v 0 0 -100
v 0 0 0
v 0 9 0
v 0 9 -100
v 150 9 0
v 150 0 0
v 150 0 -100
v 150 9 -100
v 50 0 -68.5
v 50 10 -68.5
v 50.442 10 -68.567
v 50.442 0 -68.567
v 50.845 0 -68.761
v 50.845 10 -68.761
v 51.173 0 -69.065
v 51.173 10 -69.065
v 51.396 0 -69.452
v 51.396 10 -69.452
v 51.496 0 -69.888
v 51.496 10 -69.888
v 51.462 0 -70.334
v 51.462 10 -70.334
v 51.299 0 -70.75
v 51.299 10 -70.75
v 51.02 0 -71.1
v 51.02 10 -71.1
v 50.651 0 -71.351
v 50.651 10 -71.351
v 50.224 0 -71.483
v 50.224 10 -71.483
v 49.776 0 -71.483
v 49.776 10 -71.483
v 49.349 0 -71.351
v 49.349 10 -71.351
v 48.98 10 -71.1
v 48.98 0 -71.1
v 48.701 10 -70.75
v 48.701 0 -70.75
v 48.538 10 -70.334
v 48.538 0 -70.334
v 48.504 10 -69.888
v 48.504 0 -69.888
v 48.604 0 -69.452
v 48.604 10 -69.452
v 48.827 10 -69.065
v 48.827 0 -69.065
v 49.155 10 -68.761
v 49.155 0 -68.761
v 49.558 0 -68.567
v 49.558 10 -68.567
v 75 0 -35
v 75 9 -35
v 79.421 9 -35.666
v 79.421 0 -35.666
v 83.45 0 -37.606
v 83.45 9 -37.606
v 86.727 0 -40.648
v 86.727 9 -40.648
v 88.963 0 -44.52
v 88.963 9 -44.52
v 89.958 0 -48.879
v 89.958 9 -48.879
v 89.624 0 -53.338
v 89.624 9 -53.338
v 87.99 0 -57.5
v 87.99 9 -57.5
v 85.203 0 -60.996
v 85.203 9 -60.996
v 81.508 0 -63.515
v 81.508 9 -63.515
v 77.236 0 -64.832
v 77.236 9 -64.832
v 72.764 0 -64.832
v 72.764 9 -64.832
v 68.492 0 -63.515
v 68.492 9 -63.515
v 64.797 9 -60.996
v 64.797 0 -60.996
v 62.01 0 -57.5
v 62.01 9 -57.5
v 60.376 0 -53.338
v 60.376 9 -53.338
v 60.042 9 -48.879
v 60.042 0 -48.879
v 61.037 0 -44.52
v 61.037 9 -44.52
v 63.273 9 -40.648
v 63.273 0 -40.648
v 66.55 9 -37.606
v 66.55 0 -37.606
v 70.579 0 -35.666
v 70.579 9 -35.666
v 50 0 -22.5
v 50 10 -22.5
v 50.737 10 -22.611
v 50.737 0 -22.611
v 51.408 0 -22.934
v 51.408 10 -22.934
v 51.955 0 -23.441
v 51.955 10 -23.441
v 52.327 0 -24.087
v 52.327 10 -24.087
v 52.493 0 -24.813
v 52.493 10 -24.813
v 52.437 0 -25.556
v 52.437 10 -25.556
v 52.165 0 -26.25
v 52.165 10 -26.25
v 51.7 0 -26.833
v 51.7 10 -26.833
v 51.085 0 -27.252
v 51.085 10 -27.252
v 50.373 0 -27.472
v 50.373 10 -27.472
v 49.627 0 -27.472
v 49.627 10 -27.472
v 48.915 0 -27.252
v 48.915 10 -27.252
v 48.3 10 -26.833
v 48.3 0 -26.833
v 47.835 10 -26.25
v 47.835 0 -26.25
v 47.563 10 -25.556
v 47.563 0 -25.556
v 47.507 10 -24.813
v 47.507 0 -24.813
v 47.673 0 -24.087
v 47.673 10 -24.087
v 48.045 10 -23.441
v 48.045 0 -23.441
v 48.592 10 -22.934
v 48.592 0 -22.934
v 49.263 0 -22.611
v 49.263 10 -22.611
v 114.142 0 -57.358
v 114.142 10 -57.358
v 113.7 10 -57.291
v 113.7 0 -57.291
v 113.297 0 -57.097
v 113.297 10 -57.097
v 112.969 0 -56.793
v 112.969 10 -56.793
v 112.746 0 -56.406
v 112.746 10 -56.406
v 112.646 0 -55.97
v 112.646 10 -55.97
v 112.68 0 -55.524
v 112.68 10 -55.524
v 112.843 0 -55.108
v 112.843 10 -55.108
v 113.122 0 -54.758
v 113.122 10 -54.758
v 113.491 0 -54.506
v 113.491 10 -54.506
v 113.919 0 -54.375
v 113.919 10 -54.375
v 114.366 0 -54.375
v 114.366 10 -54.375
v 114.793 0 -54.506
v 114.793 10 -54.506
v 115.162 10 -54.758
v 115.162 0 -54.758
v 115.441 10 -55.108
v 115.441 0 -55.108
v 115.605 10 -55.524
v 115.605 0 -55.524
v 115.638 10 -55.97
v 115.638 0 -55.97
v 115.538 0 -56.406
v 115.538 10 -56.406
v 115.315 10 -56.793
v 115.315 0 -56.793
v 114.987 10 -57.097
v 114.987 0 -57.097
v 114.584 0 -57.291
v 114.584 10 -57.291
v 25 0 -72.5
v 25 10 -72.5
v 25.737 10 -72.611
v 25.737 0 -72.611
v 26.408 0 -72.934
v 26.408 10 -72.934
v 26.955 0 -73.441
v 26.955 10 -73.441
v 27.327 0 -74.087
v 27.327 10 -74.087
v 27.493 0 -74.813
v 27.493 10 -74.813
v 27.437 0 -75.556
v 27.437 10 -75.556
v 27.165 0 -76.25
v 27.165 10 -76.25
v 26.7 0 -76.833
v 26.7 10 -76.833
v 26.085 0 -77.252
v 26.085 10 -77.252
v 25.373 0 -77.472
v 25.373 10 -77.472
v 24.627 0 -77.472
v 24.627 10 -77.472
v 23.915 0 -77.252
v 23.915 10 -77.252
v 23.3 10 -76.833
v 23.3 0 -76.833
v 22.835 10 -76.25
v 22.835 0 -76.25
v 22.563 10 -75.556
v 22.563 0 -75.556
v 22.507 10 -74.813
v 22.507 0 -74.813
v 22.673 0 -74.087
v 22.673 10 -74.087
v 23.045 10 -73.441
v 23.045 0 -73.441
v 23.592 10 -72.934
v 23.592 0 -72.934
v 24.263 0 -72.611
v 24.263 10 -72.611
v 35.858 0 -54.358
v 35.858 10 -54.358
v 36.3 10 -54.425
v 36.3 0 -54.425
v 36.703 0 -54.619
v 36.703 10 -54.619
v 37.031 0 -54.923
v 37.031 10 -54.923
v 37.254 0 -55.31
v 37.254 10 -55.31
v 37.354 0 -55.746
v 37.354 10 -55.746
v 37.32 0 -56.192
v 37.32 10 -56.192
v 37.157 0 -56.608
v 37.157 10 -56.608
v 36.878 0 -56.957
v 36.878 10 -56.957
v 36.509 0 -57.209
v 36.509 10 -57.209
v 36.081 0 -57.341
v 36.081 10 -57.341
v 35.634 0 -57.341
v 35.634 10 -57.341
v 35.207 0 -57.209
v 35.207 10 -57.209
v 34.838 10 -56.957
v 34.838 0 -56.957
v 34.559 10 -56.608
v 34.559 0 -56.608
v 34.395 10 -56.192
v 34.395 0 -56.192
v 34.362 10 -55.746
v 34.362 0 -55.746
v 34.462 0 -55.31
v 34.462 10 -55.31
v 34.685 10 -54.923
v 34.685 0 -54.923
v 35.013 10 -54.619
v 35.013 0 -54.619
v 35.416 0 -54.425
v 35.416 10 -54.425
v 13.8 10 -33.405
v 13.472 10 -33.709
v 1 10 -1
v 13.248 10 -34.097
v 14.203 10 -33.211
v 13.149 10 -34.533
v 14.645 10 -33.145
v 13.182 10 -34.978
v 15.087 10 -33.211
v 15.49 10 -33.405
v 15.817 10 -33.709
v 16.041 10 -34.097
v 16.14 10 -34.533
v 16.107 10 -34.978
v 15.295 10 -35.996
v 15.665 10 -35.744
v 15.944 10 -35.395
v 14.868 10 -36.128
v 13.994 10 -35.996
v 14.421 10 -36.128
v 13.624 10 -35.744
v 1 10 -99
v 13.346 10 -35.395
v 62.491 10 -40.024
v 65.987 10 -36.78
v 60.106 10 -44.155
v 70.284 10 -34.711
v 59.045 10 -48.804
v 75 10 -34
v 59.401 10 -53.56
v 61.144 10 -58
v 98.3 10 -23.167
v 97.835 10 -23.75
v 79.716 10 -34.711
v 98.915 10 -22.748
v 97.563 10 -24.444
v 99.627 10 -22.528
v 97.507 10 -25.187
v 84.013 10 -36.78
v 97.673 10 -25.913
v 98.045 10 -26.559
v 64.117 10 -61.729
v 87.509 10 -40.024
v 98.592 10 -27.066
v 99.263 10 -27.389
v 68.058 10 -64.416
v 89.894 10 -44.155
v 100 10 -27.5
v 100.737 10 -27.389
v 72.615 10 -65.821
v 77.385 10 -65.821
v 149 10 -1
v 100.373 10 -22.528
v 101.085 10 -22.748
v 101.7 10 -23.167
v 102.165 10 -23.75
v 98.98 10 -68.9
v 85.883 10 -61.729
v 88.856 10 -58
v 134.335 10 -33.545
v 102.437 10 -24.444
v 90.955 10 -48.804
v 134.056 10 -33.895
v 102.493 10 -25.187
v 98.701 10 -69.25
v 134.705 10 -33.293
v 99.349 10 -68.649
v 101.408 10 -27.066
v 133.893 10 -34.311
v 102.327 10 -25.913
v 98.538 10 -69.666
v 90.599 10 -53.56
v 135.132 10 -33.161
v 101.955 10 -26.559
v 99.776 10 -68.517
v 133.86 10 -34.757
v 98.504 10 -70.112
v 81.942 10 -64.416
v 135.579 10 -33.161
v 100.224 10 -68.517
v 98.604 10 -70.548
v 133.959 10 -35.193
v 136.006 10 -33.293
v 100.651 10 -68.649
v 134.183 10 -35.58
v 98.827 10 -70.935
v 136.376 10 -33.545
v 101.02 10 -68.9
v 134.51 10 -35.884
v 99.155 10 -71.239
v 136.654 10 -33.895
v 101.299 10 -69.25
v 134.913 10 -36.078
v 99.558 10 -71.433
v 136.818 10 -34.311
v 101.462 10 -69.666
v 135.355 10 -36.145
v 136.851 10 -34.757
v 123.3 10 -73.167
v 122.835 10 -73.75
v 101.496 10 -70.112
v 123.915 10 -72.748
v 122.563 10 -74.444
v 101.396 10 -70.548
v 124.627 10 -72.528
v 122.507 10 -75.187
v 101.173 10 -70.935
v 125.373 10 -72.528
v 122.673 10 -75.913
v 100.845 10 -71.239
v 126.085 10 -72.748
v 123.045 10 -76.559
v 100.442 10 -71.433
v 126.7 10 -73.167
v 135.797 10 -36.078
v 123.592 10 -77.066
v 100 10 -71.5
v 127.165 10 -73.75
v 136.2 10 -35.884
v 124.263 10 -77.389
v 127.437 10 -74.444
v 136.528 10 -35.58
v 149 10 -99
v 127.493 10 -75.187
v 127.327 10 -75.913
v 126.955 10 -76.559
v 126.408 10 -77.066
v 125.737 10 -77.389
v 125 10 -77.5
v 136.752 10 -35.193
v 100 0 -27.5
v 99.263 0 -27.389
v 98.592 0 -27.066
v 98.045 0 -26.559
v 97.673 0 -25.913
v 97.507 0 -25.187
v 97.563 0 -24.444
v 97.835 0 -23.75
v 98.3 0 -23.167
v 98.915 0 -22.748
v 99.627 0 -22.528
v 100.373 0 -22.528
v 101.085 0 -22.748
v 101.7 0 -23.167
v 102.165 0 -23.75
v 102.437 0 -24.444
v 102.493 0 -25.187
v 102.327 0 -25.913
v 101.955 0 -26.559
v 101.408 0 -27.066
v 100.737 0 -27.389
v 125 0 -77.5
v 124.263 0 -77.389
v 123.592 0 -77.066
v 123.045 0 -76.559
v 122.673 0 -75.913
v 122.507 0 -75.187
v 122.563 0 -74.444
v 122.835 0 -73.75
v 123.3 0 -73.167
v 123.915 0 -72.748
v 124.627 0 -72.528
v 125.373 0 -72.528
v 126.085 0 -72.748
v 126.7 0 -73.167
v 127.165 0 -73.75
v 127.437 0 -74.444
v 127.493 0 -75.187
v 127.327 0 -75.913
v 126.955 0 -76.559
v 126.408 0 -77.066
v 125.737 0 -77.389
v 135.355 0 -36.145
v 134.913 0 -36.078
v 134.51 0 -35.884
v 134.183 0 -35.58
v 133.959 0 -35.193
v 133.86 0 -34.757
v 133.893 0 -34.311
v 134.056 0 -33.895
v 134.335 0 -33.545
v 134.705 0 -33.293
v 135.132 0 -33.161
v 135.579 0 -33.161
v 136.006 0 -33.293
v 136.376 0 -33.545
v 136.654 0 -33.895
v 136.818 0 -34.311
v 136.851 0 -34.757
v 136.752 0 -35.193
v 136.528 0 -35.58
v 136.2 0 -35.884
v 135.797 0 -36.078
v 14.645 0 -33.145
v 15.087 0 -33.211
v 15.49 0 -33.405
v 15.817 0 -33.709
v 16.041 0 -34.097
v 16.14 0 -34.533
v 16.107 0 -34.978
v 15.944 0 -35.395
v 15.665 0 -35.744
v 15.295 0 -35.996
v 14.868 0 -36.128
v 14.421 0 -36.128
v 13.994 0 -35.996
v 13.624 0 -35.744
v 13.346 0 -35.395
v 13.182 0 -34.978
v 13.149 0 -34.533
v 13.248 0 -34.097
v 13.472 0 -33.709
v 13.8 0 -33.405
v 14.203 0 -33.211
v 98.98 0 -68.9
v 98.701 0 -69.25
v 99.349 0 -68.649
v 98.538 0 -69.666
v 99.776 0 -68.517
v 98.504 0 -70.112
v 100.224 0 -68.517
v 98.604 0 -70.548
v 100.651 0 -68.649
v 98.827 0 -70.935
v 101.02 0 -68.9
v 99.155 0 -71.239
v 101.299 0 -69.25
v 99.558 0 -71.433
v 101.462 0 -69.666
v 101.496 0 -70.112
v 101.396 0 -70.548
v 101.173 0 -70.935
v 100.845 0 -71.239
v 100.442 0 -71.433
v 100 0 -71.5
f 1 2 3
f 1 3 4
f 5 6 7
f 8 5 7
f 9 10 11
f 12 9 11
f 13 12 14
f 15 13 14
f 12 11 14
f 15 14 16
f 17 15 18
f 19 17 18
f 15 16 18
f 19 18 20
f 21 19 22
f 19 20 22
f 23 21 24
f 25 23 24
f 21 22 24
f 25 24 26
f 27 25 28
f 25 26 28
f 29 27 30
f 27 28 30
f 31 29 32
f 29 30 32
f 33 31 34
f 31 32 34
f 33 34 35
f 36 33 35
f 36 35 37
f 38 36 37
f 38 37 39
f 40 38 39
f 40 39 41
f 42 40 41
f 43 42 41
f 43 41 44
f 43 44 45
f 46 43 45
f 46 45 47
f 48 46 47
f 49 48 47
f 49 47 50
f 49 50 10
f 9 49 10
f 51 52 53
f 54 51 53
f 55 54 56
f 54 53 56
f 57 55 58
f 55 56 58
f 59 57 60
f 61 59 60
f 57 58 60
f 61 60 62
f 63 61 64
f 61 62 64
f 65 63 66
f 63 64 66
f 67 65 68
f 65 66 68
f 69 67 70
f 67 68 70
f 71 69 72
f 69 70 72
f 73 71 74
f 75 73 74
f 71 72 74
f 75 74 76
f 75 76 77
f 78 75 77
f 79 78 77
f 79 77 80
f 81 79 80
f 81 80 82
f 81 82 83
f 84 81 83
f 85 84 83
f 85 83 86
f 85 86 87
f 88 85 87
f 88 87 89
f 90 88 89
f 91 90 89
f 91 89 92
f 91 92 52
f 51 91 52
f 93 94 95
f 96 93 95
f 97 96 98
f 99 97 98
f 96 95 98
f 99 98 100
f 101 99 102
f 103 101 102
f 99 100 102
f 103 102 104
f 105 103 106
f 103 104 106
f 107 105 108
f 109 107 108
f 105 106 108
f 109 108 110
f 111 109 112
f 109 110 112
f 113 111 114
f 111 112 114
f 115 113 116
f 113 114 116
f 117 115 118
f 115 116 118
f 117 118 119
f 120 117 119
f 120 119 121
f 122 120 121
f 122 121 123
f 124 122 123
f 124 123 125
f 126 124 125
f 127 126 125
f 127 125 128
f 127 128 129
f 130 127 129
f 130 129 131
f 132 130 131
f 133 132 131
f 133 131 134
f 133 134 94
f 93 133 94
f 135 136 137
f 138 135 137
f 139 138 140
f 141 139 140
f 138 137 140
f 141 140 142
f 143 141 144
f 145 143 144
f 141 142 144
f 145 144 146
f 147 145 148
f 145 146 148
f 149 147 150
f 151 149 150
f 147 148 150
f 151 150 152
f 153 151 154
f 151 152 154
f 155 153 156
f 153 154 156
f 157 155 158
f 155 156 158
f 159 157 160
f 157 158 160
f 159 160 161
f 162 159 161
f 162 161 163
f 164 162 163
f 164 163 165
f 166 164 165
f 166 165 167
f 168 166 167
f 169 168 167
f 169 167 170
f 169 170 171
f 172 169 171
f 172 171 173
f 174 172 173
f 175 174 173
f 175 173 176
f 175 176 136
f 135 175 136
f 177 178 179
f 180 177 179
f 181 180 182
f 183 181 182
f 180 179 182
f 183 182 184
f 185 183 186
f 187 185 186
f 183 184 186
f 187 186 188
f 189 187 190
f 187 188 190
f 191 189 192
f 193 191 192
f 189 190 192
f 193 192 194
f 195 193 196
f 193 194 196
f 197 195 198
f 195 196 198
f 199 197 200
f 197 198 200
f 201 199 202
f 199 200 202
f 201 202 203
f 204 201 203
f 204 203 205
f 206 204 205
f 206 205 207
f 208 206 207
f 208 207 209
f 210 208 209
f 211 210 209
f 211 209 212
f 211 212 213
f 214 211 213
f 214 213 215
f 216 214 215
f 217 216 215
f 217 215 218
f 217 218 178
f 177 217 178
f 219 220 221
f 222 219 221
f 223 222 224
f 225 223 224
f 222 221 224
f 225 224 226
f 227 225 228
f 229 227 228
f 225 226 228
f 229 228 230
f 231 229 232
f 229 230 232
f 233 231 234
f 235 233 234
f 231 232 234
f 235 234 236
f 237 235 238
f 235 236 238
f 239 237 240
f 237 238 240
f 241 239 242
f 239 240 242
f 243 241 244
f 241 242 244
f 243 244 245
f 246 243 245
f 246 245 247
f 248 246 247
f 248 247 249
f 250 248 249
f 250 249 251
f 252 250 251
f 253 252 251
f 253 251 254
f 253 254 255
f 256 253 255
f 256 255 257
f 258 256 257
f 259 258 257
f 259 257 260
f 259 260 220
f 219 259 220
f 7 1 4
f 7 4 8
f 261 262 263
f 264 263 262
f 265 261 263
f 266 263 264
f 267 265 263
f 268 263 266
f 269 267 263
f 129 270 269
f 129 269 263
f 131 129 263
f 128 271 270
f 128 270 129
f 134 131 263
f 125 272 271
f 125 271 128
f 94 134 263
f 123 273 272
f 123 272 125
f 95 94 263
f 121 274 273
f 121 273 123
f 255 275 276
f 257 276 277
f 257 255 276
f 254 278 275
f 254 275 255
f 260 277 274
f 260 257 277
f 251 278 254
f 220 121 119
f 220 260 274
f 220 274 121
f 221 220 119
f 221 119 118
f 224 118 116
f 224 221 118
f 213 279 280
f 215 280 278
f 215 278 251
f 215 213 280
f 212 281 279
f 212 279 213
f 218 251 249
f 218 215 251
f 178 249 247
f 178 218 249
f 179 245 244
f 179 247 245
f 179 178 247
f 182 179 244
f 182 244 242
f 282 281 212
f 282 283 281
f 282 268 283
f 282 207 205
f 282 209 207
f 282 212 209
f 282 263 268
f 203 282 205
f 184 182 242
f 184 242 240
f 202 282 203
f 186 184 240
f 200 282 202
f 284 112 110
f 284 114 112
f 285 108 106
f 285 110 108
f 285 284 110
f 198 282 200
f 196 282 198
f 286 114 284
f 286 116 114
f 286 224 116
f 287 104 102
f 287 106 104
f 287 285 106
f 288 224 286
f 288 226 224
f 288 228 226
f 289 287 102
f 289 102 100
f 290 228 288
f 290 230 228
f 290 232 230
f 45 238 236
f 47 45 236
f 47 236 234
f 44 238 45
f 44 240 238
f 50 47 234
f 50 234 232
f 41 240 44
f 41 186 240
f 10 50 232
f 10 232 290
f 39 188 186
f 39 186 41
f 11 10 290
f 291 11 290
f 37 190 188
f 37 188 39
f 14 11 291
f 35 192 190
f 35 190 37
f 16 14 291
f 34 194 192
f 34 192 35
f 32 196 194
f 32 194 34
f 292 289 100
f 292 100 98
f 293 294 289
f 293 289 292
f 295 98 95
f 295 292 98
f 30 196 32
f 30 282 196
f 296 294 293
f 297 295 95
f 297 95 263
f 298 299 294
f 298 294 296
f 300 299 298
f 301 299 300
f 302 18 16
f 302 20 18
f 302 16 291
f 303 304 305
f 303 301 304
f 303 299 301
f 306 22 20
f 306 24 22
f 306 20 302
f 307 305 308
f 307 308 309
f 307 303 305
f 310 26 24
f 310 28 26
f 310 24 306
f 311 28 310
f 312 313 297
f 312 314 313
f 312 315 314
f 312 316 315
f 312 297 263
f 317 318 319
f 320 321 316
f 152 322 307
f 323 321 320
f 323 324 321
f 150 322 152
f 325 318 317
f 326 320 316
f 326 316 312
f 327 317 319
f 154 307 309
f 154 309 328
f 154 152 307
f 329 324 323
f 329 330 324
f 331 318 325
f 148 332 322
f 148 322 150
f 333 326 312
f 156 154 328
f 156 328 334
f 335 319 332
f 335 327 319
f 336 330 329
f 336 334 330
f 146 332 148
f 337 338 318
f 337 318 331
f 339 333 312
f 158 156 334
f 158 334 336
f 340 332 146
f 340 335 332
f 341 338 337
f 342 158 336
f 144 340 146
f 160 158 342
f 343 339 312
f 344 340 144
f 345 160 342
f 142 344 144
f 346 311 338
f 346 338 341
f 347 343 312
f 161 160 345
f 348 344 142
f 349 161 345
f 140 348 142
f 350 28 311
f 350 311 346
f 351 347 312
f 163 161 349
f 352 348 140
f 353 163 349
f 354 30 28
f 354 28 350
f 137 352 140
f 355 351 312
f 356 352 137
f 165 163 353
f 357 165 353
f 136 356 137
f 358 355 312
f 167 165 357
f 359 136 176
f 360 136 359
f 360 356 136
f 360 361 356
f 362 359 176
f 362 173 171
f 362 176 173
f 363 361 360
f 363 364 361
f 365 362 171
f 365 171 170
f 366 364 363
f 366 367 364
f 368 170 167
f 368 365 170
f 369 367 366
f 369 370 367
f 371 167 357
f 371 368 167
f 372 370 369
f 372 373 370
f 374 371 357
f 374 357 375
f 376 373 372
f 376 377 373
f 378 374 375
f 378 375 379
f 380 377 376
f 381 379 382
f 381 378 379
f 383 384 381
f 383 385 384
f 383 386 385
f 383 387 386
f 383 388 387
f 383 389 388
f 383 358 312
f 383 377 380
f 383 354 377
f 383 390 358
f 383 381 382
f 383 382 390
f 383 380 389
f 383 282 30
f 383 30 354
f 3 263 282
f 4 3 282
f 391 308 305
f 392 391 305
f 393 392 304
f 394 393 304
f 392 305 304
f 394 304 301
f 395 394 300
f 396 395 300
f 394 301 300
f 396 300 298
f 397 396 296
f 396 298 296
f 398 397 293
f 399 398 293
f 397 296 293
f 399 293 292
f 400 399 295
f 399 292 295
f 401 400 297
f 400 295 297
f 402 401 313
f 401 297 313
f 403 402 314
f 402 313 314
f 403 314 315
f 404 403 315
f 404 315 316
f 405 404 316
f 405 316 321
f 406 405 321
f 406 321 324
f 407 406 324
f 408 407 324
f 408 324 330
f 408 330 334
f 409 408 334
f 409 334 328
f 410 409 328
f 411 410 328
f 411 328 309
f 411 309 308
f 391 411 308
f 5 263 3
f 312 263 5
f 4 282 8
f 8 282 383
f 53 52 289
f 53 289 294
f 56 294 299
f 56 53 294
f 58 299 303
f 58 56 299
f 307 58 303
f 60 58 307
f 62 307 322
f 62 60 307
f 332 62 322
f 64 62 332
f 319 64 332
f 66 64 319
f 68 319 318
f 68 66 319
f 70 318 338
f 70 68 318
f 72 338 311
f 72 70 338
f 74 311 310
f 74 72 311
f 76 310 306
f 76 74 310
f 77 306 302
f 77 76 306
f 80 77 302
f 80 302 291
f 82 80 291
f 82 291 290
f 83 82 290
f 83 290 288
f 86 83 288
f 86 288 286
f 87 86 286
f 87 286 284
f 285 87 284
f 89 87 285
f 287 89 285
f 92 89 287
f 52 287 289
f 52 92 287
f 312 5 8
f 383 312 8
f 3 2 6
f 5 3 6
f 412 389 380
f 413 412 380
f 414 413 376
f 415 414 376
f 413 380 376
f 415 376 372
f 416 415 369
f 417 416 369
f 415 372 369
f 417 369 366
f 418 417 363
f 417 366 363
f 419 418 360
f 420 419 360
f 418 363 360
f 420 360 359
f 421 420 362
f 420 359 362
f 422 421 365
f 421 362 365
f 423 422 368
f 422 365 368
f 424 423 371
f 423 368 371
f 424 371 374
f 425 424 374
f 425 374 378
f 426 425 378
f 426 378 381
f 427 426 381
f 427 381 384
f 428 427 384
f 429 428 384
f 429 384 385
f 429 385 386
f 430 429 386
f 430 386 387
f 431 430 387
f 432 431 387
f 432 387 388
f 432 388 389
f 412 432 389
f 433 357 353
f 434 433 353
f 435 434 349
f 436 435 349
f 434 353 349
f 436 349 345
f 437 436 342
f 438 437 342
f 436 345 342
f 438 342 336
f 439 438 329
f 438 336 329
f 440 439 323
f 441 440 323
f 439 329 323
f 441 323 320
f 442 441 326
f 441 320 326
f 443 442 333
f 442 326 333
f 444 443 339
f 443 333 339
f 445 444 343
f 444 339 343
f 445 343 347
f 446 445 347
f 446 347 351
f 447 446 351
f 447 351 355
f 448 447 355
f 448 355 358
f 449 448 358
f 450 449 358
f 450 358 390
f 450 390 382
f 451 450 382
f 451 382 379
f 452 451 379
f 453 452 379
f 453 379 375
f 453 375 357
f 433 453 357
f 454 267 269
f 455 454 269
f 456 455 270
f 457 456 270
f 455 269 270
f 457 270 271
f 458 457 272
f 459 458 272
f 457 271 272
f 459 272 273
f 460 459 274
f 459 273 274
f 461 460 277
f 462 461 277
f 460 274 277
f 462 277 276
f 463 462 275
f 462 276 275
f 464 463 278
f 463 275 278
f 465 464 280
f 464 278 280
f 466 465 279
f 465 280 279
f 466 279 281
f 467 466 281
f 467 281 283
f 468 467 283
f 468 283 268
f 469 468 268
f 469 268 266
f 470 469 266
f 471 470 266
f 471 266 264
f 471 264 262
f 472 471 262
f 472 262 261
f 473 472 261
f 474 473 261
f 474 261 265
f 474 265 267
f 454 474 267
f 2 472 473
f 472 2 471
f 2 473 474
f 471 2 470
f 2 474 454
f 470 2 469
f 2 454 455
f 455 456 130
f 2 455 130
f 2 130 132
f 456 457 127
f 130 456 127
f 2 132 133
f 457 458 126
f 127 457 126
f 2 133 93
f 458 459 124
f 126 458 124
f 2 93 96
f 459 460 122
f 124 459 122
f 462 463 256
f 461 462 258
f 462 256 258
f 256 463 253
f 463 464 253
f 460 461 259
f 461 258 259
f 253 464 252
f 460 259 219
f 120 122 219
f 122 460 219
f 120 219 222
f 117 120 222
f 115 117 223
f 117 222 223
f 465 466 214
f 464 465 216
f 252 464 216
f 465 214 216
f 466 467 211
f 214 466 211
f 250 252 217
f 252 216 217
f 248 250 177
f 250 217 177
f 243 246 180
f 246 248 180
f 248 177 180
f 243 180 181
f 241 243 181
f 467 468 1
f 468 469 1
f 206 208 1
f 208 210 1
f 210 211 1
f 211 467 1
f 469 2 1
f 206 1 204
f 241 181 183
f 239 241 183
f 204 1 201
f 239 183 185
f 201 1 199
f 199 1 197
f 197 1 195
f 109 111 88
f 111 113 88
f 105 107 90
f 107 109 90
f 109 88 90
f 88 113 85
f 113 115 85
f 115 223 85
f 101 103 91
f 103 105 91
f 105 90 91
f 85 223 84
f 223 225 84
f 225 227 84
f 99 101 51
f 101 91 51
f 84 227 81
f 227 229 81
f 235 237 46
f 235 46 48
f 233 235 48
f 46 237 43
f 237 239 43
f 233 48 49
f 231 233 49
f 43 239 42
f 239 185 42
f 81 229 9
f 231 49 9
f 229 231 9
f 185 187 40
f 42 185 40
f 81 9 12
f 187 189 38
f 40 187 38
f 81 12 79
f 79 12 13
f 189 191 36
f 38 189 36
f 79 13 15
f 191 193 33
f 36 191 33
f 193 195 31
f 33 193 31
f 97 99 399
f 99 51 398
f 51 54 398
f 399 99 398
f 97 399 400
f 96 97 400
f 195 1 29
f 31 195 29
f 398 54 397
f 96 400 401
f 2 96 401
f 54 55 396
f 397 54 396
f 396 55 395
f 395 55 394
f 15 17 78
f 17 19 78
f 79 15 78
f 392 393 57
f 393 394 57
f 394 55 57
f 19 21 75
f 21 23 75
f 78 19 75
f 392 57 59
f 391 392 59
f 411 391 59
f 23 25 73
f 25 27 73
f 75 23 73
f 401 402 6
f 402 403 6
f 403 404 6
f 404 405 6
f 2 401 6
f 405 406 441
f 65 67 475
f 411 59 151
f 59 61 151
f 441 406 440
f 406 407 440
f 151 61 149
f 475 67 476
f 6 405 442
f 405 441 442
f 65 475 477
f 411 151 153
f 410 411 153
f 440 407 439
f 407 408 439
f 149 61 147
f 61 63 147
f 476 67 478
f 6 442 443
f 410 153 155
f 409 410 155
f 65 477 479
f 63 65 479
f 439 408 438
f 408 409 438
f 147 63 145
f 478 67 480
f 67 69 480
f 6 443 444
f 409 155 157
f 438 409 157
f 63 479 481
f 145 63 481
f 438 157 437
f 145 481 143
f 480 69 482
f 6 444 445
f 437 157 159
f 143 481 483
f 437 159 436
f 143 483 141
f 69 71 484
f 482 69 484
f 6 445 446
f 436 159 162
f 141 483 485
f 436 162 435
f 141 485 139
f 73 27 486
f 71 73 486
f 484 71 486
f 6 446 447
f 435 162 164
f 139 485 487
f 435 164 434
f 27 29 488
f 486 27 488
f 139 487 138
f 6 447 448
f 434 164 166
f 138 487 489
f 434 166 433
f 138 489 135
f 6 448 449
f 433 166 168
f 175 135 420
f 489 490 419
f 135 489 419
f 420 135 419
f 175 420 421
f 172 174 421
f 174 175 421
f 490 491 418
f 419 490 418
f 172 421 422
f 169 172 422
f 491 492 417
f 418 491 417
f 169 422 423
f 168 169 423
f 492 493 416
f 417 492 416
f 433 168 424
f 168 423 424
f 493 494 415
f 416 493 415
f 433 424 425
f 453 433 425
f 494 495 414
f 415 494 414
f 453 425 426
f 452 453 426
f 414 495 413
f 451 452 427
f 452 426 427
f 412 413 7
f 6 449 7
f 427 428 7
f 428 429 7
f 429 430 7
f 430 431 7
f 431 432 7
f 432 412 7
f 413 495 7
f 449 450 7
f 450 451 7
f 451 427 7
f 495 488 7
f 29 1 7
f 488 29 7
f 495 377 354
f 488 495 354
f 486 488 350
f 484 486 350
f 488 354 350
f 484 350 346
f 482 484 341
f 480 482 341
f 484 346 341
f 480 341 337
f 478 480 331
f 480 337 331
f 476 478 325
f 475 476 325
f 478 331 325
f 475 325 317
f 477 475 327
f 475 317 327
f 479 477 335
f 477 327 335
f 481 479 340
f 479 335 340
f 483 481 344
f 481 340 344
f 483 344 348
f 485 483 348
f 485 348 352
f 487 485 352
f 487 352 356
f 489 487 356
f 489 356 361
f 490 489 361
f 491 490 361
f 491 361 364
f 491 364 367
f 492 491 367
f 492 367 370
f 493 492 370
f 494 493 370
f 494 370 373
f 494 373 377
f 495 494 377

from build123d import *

# Parameters (mm, degrees)
SKETCH1_W           = 150
SKETCH1_H           = 100
BOSS_EXTRUDE1_DEPTH = 10
SKETCH2_R           = 15
SKETCH2_R_2         = 1.5
SKETCH2_R_3         = 2.5
CUT_EXTRUDE1_DEPTH  = 181.554700853
CHAMFER1_SIZE       = 1


with BuildPart() as part:
    # Sketch1 → Boss-Extrude1 (new body)
    with BuildSketch(Plane(origin=(0, 0, 0), x_dir=(1, 0, 0), z_dir=(0, 1, 0))):
        with Locations((75, 50)):
            Rectangle(SKETCH1_W, SKETCH1_H)
    extrude(amount=BOSS_EXTRUDE1_DEPTH)

    # Sketch2 → Cut-Extrude1 (cut, through all)
    with BuildSketch(Plane(origin=(0, 10, 0), x_dir=(1, 0, 0), z_dir=(0, 1, 0))):
        with Locations(Location((75, 50, 0), (0, 0, 270))):
            Circle(SKETCH2_R)
        with Locations(Location((100, 70, 0), (0, 0, 90))):
            Circle(SKETCH2_R_2)
        with Locations(Location((125, 75, 0), (0, 0, 90))):
            Circle(SKETCH2_R_3)
        with Locations(Location((114.142135624, 55.857864376, 0), (0, 0, 90))):
            Circle(SKETCH2_R_2)
        with Locations(Location((135.355339059, 34.644660941, 0), (0, 0, 90))):
            Circle(SKETCH2_R_2)
        with Locations(Location((100, 25, 0), (0, 0, 90))):
            Circle(SKETCH2_R_3)
        with Locations(Location((50, 25, 0), (0, 0, 270))):
            Circle(SKETCH2_R_3)
        with Locations(Location((14.644660941, 34.644660941, 0), (0, 0, 270))):
            Circle(SKETCH2_R_2)
        with Locations(Location((35.857864376, 55.857864376, 0), (0, 0, 270))):
            Circle(SKETCH2_R_2)
        with Locations(Location((50, 70, 0), (0, 0, 270))):
            Circle(SKETCH2_R_2)
        with Locations(Location((25, 75, 0), (0, 0, 270))):
            Circle(SKETCH2_R_3)
    extrude(amount=-CUT_EXTRUDE1_DEPTH, mode=Mode.SUBTRACT)

    # Chamfer1
    chamfer1_edges = [part.edges().sort_by_distance(p)[0] for p in [
        (150, 10, -50),
        (75, 10, -100),
        (75, 10, -65),
        (0, 10, -50),
        (75, 10, 0),
    ]]
    chamfer(chamfer1_edges, length=CHAMFER1_SIZE)


solid = part.part
